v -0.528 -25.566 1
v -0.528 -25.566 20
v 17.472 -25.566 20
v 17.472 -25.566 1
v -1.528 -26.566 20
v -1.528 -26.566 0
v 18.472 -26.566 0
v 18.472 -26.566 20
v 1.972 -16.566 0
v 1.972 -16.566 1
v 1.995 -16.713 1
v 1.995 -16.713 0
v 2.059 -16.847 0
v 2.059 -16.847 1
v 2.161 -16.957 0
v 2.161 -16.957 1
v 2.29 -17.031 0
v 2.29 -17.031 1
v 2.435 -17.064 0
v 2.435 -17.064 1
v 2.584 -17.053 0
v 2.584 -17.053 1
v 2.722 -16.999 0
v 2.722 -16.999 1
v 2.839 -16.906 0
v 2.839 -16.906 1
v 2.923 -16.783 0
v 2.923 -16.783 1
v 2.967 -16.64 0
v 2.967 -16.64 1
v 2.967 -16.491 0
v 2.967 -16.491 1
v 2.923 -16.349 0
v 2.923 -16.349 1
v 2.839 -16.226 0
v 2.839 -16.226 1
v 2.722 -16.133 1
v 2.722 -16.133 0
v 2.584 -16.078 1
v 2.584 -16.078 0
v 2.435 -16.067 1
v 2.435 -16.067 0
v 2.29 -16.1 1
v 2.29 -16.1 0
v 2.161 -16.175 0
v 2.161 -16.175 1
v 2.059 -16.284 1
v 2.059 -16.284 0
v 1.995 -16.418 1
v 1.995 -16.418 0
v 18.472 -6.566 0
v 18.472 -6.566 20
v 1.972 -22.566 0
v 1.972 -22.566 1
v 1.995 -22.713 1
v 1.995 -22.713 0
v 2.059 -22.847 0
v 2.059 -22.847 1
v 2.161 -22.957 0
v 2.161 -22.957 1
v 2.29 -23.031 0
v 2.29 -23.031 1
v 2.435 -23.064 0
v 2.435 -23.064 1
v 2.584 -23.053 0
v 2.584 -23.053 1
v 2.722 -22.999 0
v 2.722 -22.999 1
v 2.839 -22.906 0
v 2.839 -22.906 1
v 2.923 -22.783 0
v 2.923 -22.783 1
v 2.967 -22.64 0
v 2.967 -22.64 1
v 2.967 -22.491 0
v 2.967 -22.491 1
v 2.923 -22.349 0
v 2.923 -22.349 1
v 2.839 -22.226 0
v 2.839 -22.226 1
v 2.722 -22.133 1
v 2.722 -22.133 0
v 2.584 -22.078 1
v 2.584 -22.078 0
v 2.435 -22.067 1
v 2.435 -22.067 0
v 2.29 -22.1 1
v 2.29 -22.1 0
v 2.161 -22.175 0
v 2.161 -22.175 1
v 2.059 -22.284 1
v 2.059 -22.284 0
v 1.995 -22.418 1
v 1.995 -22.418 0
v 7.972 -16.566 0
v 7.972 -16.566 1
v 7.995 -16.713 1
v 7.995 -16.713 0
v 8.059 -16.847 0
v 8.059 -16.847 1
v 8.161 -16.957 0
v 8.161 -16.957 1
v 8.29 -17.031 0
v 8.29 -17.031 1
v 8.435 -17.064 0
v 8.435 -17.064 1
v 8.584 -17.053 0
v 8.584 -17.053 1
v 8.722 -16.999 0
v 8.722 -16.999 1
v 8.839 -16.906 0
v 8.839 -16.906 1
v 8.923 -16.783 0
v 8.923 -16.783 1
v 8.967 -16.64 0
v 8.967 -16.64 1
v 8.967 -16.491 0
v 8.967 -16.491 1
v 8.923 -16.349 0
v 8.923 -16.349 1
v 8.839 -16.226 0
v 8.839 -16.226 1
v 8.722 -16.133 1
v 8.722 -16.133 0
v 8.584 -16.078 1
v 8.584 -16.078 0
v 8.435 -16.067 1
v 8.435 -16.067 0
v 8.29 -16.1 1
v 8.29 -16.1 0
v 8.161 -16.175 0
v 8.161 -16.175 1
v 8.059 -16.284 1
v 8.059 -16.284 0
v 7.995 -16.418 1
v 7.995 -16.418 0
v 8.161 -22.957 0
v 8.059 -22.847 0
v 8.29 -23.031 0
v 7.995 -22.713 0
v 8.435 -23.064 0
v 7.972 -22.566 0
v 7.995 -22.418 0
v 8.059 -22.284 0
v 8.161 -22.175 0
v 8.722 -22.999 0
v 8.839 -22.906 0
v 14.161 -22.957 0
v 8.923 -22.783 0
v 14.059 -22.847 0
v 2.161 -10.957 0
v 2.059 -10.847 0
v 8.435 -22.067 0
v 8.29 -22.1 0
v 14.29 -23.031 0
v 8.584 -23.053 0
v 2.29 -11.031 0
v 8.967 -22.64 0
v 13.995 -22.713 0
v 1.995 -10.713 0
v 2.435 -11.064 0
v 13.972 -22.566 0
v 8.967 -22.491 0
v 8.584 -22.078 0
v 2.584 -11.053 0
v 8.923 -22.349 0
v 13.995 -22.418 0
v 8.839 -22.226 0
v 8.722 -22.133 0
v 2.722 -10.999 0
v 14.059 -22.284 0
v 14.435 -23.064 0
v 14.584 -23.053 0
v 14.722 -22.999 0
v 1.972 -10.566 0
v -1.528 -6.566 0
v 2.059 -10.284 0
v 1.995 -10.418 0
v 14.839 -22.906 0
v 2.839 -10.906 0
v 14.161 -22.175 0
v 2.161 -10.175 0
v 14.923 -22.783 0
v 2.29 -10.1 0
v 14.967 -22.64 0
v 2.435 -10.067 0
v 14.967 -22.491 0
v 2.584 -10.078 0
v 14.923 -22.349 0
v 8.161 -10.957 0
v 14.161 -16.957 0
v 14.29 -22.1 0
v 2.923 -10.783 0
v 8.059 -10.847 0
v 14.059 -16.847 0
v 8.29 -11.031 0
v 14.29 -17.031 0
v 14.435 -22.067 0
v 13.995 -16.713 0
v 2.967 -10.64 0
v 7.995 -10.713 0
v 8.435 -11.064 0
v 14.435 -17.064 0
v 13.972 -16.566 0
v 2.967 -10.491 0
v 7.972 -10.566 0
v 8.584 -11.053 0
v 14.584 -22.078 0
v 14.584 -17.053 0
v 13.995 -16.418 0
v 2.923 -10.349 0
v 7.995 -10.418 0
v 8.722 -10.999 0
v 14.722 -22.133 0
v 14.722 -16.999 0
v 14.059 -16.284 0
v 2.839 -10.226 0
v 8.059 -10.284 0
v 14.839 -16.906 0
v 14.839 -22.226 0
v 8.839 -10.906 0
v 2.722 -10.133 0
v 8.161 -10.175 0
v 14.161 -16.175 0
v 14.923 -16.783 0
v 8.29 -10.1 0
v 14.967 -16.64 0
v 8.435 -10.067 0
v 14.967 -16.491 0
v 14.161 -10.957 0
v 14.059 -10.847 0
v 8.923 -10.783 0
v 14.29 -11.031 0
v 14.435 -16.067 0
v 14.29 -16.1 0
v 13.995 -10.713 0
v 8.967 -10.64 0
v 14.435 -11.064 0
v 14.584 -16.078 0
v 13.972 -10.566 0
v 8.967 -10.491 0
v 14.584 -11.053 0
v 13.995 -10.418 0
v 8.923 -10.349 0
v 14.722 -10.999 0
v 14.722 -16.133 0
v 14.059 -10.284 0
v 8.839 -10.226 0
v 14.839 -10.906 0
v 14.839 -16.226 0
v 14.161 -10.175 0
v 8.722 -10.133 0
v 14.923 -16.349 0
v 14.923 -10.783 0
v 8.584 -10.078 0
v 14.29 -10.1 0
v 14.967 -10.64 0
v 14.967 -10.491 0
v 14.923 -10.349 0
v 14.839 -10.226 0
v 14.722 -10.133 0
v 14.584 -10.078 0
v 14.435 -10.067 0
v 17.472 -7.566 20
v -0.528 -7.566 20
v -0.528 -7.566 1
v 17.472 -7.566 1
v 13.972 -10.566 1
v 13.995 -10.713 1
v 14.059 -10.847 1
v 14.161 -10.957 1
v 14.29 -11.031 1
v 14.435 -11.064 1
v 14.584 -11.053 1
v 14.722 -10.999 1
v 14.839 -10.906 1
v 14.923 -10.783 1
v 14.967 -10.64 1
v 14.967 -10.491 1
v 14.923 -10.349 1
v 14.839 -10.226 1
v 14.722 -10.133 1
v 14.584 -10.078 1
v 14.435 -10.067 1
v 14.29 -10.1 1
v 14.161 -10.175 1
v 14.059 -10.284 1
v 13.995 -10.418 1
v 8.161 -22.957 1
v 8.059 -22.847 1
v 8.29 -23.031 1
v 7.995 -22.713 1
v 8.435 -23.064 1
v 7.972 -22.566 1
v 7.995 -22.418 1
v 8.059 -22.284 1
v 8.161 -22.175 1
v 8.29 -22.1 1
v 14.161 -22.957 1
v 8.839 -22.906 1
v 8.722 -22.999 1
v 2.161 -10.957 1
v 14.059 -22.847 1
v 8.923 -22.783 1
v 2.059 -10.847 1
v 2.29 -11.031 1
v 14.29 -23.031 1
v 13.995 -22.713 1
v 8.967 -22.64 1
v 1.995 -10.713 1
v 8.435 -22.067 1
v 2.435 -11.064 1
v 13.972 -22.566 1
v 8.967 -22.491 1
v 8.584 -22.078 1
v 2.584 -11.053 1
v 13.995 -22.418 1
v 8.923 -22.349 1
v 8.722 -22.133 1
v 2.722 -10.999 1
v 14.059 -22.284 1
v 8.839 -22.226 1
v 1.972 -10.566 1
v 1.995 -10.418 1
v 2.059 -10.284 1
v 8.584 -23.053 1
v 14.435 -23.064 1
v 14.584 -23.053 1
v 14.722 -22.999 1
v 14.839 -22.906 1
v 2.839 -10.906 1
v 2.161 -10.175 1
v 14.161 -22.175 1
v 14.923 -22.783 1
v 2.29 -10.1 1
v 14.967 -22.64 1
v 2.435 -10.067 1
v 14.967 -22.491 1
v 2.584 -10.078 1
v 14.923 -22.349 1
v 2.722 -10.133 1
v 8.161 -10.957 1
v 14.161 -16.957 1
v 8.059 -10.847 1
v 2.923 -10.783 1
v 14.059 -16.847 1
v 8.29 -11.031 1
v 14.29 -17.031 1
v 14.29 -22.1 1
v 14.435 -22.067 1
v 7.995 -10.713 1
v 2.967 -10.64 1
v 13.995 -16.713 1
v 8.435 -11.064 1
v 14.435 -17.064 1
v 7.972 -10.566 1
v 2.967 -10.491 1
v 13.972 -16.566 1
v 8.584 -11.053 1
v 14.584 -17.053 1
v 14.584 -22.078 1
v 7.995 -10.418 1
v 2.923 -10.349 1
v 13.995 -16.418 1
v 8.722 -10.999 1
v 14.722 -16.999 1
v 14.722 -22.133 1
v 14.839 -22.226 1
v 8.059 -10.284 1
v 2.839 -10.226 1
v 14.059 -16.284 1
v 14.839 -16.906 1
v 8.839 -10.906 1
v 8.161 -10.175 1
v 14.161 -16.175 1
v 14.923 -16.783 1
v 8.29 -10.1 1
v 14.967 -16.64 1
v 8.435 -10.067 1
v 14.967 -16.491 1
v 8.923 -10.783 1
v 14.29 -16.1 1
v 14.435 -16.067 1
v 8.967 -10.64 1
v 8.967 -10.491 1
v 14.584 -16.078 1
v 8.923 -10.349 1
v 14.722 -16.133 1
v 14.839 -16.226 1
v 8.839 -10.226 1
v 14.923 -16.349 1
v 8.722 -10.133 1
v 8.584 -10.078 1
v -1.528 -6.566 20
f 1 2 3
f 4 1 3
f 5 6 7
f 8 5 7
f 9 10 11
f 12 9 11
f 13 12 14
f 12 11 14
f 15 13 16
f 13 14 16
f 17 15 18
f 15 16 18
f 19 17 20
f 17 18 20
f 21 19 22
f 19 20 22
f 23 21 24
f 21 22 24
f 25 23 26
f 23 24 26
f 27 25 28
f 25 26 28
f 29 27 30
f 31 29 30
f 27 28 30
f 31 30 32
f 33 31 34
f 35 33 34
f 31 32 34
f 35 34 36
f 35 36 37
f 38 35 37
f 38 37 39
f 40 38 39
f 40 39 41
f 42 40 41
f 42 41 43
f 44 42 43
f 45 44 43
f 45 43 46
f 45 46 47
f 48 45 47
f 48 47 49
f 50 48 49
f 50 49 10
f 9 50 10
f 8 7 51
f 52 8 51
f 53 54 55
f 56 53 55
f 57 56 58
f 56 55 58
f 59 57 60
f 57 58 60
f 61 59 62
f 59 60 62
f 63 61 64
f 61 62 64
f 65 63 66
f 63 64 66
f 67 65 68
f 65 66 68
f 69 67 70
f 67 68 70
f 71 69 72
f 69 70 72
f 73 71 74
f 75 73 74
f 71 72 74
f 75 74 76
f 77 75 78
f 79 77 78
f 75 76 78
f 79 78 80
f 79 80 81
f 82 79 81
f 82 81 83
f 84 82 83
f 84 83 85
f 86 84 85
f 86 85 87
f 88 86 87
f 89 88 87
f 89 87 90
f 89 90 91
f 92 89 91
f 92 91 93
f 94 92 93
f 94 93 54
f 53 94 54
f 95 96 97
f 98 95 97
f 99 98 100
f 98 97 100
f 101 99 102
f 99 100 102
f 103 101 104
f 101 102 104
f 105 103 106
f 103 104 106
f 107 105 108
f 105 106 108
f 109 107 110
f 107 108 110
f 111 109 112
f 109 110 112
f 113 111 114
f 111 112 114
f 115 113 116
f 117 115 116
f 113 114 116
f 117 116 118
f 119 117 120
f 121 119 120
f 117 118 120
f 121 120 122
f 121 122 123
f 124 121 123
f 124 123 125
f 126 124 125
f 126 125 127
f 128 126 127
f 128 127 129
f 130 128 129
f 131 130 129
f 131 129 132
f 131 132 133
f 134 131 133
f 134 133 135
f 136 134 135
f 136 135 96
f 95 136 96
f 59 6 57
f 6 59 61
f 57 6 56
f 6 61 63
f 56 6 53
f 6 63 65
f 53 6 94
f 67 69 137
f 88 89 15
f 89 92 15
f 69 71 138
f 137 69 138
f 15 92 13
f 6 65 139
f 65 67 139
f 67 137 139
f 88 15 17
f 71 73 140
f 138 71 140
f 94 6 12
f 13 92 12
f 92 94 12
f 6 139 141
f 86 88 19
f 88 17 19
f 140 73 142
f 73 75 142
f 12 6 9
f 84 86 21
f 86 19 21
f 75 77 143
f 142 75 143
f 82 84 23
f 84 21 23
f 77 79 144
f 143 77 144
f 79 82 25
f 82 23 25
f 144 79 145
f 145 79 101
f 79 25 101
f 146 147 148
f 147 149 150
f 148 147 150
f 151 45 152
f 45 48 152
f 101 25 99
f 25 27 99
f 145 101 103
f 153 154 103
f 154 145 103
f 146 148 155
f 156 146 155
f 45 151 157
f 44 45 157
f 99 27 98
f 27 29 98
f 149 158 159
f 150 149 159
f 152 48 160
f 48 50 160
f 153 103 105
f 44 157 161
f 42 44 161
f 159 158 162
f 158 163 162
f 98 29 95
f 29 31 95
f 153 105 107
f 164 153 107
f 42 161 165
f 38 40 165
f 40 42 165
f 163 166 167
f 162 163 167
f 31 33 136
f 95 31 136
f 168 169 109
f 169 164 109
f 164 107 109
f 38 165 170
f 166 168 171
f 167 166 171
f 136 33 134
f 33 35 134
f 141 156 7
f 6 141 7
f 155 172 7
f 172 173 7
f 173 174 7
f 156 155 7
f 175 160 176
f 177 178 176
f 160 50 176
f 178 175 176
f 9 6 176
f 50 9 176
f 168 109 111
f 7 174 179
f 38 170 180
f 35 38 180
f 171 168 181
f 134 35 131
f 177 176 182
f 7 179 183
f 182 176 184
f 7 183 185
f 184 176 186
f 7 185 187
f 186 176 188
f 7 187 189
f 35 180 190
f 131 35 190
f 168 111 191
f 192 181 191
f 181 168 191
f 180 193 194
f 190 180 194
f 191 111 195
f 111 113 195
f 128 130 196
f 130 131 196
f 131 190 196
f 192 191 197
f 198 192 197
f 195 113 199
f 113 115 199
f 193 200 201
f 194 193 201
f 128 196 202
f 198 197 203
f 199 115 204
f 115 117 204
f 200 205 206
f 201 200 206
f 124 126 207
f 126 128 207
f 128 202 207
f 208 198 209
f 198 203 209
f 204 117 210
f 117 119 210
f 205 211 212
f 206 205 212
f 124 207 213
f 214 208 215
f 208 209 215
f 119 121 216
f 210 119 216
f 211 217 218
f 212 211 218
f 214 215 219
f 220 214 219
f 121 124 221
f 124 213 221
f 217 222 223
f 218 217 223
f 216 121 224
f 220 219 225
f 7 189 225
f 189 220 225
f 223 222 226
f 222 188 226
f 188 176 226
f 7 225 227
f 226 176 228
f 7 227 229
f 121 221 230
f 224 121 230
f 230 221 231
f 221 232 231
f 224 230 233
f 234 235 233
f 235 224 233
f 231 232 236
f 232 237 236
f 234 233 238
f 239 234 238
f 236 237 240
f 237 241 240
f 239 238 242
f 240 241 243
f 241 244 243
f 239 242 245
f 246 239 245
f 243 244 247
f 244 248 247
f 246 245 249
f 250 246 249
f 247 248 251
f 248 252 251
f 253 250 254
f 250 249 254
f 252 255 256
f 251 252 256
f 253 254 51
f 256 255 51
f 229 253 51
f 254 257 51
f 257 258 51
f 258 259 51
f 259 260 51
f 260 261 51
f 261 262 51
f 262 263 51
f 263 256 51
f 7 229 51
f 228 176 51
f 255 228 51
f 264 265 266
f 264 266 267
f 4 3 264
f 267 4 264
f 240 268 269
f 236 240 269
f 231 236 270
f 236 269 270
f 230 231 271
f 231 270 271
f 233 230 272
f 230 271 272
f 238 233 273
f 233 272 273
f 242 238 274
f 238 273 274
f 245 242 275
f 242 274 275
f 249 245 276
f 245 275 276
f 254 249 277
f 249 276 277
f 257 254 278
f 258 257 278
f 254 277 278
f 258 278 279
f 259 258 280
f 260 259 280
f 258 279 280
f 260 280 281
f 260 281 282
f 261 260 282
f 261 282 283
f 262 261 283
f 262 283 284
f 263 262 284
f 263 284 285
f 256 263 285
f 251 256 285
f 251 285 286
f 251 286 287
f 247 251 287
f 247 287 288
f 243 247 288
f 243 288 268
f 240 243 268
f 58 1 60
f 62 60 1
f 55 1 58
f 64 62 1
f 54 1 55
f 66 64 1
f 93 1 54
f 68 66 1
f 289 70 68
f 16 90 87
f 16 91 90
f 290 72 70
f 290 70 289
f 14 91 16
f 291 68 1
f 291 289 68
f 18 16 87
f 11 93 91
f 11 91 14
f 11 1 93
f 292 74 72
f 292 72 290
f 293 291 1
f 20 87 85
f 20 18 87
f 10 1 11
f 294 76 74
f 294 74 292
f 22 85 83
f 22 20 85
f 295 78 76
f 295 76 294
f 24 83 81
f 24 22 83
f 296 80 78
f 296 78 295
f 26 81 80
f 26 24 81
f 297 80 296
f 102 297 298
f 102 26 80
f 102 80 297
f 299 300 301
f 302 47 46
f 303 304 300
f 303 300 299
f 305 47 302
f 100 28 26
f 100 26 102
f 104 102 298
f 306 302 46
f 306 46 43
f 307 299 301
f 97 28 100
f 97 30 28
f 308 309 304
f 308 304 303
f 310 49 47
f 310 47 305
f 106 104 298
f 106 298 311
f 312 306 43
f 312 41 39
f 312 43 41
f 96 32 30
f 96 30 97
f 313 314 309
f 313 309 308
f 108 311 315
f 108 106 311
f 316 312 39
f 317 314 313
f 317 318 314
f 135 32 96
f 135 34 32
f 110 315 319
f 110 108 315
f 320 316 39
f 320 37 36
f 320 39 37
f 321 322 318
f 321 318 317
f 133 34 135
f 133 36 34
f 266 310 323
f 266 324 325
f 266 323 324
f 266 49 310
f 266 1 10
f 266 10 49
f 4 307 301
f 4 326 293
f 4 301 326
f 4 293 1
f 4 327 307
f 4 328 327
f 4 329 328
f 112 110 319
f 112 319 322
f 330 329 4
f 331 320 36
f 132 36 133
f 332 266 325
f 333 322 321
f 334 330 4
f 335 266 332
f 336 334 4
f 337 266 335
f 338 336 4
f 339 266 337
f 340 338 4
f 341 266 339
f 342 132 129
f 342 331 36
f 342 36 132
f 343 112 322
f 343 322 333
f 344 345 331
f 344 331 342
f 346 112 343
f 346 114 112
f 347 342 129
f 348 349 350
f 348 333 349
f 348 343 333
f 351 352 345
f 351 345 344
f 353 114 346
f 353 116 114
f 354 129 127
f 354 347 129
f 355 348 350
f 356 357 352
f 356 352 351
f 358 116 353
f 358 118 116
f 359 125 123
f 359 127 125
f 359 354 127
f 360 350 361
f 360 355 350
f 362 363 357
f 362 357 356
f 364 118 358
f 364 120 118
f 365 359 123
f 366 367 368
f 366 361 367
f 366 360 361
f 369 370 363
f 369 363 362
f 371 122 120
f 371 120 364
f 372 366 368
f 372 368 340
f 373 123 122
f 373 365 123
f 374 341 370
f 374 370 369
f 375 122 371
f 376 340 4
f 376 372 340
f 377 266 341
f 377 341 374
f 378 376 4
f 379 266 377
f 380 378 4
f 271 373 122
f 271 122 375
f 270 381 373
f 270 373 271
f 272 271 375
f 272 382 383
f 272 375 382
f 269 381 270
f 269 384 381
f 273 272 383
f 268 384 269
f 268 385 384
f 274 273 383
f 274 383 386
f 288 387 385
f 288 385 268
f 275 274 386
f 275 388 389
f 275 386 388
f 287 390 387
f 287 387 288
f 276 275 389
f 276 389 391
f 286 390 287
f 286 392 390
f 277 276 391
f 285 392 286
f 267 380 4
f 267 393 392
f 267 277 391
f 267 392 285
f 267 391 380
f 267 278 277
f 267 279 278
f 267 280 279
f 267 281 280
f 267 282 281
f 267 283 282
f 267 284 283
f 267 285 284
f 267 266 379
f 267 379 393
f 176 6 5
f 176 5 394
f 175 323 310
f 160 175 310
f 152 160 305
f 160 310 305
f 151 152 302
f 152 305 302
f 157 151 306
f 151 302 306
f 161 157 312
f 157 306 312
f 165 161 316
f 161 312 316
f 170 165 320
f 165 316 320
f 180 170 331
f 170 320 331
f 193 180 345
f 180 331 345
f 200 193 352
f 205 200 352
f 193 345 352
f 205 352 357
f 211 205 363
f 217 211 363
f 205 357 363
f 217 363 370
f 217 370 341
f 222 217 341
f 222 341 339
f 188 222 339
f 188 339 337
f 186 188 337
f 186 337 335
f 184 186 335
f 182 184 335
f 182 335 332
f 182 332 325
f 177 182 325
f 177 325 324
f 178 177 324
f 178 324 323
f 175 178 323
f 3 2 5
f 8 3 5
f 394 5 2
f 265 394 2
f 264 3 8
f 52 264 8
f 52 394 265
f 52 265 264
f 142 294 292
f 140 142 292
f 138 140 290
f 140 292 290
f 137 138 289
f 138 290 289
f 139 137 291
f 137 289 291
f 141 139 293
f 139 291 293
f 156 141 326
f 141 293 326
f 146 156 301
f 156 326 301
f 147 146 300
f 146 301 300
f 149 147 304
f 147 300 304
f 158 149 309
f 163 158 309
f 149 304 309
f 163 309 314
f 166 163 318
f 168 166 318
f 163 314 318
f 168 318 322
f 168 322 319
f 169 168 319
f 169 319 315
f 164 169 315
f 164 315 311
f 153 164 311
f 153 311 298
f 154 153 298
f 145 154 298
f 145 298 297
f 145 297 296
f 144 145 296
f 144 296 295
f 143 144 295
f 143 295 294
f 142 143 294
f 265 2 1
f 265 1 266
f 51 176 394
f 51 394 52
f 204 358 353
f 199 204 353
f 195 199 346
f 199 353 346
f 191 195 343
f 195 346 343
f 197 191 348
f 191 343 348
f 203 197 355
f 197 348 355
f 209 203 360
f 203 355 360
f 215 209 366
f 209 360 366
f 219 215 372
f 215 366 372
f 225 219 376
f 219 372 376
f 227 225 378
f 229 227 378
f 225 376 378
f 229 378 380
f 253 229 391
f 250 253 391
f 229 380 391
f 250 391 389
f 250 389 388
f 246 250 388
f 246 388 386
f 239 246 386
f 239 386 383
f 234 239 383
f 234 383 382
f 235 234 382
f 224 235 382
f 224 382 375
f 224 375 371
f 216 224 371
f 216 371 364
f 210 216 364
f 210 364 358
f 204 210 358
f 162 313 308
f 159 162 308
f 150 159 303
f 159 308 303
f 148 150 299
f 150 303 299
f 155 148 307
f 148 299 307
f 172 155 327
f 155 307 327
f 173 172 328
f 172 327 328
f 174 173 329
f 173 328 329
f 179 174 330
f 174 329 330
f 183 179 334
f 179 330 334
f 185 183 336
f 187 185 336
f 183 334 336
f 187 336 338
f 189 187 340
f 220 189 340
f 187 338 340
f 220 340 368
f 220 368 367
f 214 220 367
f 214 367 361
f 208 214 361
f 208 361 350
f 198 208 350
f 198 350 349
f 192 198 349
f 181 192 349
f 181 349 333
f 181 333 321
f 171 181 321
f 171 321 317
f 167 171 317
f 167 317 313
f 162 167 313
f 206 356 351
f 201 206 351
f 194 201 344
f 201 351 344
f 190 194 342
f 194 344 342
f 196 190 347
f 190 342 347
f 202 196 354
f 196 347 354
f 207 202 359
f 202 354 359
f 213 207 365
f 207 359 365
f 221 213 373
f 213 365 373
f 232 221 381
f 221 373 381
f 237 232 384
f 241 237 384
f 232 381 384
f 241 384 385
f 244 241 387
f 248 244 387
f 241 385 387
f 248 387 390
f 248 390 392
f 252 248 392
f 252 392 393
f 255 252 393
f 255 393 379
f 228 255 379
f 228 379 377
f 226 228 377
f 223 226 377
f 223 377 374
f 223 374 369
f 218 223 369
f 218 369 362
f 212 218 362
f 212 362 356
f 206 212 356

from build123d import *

# Parameters (mm, degrees)
F0_W     = 20
F0_H     = 20
F1_DEPTH = 20
F2_T     = -1
F4_D     = 1


with BuildPart() as f1:
    # F0 (on Top) → F1 (new body)
    with BuildSketch(Plane.XY):
        with Locations((8.472297, -16.565783)):
            Rectangle(F0_W, F0_H)
    extrude(amount=F1_DEPTH)

    # F2
    f2_openings = [f1.faces().sort_by_distance(p)[0] for p in [
        (8.472297, -16.565783, 20),
    ]]
    offset(amount=F2_T, openings=f2_openings)

    # F4 (through all)
    with Locations(Plane(origin=(0, 0, 0), x_dir=(1, 0, 0), z_dir=(0, 0, -1))):
        with Locations((14.472297, 10.565783), (8.472297, 10.565783), (2.472297, 10.565783), (2.472297, 16.565783), (8.472297, 16.565783), (14.472297, 16.565783), (14.472297, 22.565783), (8.472297, 22.565783), (2.472297, 22.565783)):
            Hole(F4_D / 2)


solid = f1.part
